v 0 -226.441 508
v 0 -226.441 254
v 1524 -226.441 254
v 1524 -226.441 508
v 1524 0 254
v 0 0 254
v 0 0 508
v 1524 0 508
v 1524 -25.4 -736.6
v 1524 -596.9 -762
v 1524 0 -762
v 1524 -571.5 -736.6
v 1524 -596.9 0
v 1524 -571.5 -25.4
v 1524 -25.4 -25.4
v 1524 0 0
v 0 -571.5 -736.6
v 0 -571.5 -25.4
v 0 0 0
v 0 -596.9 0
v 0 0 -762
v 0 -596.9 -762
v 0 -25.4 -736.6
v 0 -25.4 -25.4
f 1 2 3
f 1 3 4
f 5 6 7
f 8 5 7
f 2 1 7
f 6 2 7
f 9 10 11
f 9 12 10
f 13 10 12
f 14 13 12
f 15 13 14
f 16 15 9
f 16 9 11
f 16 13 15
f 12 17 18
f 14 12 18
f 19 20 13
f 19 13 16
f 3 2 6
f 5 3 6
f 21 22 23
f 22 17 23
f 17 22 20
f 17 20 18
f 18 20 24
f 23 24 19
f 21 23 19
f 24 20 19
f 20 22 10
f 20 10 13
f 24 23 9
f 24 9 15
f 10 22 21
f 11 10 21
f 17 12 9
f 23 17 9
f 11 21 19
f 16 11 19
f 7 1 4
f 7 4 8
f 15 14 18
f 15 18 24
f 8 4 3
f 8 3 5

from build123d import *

# Parameters (mm, degrees)
F0_W     = 596.9
F0_H     = 762
F0_W_2   = 226.44113
F0_H_2   = 254
F1_DEPTH = 1524
F2_W     = 546.1
F2_H     = 711.2
F3_DEPTH = 1693.74904


with BuildPart() as f1:
    # F0 (on Right) → F1 (new body)
    with BuildSketch(Plane.YZ):
        with Locations((-298.45, -381)):
            Rectangle(F0_W, F0_H)
        with Locations((-113.220565, 381)):
            Rectangle(F0_W_2, F0_H_2)
    extrude(amount=F1_DEPTH)

    # F2 (on face) → F3 (cut)
    with BuildSketch(Plane.YZ.offset(1524)):
        with Locations((-298.45, -381)):
            Rectangle(F2_W, F2_H)
    extrude(amount=-F3_DEPTH, mode=Mode.SUBTRACT)


solid = f1.part
